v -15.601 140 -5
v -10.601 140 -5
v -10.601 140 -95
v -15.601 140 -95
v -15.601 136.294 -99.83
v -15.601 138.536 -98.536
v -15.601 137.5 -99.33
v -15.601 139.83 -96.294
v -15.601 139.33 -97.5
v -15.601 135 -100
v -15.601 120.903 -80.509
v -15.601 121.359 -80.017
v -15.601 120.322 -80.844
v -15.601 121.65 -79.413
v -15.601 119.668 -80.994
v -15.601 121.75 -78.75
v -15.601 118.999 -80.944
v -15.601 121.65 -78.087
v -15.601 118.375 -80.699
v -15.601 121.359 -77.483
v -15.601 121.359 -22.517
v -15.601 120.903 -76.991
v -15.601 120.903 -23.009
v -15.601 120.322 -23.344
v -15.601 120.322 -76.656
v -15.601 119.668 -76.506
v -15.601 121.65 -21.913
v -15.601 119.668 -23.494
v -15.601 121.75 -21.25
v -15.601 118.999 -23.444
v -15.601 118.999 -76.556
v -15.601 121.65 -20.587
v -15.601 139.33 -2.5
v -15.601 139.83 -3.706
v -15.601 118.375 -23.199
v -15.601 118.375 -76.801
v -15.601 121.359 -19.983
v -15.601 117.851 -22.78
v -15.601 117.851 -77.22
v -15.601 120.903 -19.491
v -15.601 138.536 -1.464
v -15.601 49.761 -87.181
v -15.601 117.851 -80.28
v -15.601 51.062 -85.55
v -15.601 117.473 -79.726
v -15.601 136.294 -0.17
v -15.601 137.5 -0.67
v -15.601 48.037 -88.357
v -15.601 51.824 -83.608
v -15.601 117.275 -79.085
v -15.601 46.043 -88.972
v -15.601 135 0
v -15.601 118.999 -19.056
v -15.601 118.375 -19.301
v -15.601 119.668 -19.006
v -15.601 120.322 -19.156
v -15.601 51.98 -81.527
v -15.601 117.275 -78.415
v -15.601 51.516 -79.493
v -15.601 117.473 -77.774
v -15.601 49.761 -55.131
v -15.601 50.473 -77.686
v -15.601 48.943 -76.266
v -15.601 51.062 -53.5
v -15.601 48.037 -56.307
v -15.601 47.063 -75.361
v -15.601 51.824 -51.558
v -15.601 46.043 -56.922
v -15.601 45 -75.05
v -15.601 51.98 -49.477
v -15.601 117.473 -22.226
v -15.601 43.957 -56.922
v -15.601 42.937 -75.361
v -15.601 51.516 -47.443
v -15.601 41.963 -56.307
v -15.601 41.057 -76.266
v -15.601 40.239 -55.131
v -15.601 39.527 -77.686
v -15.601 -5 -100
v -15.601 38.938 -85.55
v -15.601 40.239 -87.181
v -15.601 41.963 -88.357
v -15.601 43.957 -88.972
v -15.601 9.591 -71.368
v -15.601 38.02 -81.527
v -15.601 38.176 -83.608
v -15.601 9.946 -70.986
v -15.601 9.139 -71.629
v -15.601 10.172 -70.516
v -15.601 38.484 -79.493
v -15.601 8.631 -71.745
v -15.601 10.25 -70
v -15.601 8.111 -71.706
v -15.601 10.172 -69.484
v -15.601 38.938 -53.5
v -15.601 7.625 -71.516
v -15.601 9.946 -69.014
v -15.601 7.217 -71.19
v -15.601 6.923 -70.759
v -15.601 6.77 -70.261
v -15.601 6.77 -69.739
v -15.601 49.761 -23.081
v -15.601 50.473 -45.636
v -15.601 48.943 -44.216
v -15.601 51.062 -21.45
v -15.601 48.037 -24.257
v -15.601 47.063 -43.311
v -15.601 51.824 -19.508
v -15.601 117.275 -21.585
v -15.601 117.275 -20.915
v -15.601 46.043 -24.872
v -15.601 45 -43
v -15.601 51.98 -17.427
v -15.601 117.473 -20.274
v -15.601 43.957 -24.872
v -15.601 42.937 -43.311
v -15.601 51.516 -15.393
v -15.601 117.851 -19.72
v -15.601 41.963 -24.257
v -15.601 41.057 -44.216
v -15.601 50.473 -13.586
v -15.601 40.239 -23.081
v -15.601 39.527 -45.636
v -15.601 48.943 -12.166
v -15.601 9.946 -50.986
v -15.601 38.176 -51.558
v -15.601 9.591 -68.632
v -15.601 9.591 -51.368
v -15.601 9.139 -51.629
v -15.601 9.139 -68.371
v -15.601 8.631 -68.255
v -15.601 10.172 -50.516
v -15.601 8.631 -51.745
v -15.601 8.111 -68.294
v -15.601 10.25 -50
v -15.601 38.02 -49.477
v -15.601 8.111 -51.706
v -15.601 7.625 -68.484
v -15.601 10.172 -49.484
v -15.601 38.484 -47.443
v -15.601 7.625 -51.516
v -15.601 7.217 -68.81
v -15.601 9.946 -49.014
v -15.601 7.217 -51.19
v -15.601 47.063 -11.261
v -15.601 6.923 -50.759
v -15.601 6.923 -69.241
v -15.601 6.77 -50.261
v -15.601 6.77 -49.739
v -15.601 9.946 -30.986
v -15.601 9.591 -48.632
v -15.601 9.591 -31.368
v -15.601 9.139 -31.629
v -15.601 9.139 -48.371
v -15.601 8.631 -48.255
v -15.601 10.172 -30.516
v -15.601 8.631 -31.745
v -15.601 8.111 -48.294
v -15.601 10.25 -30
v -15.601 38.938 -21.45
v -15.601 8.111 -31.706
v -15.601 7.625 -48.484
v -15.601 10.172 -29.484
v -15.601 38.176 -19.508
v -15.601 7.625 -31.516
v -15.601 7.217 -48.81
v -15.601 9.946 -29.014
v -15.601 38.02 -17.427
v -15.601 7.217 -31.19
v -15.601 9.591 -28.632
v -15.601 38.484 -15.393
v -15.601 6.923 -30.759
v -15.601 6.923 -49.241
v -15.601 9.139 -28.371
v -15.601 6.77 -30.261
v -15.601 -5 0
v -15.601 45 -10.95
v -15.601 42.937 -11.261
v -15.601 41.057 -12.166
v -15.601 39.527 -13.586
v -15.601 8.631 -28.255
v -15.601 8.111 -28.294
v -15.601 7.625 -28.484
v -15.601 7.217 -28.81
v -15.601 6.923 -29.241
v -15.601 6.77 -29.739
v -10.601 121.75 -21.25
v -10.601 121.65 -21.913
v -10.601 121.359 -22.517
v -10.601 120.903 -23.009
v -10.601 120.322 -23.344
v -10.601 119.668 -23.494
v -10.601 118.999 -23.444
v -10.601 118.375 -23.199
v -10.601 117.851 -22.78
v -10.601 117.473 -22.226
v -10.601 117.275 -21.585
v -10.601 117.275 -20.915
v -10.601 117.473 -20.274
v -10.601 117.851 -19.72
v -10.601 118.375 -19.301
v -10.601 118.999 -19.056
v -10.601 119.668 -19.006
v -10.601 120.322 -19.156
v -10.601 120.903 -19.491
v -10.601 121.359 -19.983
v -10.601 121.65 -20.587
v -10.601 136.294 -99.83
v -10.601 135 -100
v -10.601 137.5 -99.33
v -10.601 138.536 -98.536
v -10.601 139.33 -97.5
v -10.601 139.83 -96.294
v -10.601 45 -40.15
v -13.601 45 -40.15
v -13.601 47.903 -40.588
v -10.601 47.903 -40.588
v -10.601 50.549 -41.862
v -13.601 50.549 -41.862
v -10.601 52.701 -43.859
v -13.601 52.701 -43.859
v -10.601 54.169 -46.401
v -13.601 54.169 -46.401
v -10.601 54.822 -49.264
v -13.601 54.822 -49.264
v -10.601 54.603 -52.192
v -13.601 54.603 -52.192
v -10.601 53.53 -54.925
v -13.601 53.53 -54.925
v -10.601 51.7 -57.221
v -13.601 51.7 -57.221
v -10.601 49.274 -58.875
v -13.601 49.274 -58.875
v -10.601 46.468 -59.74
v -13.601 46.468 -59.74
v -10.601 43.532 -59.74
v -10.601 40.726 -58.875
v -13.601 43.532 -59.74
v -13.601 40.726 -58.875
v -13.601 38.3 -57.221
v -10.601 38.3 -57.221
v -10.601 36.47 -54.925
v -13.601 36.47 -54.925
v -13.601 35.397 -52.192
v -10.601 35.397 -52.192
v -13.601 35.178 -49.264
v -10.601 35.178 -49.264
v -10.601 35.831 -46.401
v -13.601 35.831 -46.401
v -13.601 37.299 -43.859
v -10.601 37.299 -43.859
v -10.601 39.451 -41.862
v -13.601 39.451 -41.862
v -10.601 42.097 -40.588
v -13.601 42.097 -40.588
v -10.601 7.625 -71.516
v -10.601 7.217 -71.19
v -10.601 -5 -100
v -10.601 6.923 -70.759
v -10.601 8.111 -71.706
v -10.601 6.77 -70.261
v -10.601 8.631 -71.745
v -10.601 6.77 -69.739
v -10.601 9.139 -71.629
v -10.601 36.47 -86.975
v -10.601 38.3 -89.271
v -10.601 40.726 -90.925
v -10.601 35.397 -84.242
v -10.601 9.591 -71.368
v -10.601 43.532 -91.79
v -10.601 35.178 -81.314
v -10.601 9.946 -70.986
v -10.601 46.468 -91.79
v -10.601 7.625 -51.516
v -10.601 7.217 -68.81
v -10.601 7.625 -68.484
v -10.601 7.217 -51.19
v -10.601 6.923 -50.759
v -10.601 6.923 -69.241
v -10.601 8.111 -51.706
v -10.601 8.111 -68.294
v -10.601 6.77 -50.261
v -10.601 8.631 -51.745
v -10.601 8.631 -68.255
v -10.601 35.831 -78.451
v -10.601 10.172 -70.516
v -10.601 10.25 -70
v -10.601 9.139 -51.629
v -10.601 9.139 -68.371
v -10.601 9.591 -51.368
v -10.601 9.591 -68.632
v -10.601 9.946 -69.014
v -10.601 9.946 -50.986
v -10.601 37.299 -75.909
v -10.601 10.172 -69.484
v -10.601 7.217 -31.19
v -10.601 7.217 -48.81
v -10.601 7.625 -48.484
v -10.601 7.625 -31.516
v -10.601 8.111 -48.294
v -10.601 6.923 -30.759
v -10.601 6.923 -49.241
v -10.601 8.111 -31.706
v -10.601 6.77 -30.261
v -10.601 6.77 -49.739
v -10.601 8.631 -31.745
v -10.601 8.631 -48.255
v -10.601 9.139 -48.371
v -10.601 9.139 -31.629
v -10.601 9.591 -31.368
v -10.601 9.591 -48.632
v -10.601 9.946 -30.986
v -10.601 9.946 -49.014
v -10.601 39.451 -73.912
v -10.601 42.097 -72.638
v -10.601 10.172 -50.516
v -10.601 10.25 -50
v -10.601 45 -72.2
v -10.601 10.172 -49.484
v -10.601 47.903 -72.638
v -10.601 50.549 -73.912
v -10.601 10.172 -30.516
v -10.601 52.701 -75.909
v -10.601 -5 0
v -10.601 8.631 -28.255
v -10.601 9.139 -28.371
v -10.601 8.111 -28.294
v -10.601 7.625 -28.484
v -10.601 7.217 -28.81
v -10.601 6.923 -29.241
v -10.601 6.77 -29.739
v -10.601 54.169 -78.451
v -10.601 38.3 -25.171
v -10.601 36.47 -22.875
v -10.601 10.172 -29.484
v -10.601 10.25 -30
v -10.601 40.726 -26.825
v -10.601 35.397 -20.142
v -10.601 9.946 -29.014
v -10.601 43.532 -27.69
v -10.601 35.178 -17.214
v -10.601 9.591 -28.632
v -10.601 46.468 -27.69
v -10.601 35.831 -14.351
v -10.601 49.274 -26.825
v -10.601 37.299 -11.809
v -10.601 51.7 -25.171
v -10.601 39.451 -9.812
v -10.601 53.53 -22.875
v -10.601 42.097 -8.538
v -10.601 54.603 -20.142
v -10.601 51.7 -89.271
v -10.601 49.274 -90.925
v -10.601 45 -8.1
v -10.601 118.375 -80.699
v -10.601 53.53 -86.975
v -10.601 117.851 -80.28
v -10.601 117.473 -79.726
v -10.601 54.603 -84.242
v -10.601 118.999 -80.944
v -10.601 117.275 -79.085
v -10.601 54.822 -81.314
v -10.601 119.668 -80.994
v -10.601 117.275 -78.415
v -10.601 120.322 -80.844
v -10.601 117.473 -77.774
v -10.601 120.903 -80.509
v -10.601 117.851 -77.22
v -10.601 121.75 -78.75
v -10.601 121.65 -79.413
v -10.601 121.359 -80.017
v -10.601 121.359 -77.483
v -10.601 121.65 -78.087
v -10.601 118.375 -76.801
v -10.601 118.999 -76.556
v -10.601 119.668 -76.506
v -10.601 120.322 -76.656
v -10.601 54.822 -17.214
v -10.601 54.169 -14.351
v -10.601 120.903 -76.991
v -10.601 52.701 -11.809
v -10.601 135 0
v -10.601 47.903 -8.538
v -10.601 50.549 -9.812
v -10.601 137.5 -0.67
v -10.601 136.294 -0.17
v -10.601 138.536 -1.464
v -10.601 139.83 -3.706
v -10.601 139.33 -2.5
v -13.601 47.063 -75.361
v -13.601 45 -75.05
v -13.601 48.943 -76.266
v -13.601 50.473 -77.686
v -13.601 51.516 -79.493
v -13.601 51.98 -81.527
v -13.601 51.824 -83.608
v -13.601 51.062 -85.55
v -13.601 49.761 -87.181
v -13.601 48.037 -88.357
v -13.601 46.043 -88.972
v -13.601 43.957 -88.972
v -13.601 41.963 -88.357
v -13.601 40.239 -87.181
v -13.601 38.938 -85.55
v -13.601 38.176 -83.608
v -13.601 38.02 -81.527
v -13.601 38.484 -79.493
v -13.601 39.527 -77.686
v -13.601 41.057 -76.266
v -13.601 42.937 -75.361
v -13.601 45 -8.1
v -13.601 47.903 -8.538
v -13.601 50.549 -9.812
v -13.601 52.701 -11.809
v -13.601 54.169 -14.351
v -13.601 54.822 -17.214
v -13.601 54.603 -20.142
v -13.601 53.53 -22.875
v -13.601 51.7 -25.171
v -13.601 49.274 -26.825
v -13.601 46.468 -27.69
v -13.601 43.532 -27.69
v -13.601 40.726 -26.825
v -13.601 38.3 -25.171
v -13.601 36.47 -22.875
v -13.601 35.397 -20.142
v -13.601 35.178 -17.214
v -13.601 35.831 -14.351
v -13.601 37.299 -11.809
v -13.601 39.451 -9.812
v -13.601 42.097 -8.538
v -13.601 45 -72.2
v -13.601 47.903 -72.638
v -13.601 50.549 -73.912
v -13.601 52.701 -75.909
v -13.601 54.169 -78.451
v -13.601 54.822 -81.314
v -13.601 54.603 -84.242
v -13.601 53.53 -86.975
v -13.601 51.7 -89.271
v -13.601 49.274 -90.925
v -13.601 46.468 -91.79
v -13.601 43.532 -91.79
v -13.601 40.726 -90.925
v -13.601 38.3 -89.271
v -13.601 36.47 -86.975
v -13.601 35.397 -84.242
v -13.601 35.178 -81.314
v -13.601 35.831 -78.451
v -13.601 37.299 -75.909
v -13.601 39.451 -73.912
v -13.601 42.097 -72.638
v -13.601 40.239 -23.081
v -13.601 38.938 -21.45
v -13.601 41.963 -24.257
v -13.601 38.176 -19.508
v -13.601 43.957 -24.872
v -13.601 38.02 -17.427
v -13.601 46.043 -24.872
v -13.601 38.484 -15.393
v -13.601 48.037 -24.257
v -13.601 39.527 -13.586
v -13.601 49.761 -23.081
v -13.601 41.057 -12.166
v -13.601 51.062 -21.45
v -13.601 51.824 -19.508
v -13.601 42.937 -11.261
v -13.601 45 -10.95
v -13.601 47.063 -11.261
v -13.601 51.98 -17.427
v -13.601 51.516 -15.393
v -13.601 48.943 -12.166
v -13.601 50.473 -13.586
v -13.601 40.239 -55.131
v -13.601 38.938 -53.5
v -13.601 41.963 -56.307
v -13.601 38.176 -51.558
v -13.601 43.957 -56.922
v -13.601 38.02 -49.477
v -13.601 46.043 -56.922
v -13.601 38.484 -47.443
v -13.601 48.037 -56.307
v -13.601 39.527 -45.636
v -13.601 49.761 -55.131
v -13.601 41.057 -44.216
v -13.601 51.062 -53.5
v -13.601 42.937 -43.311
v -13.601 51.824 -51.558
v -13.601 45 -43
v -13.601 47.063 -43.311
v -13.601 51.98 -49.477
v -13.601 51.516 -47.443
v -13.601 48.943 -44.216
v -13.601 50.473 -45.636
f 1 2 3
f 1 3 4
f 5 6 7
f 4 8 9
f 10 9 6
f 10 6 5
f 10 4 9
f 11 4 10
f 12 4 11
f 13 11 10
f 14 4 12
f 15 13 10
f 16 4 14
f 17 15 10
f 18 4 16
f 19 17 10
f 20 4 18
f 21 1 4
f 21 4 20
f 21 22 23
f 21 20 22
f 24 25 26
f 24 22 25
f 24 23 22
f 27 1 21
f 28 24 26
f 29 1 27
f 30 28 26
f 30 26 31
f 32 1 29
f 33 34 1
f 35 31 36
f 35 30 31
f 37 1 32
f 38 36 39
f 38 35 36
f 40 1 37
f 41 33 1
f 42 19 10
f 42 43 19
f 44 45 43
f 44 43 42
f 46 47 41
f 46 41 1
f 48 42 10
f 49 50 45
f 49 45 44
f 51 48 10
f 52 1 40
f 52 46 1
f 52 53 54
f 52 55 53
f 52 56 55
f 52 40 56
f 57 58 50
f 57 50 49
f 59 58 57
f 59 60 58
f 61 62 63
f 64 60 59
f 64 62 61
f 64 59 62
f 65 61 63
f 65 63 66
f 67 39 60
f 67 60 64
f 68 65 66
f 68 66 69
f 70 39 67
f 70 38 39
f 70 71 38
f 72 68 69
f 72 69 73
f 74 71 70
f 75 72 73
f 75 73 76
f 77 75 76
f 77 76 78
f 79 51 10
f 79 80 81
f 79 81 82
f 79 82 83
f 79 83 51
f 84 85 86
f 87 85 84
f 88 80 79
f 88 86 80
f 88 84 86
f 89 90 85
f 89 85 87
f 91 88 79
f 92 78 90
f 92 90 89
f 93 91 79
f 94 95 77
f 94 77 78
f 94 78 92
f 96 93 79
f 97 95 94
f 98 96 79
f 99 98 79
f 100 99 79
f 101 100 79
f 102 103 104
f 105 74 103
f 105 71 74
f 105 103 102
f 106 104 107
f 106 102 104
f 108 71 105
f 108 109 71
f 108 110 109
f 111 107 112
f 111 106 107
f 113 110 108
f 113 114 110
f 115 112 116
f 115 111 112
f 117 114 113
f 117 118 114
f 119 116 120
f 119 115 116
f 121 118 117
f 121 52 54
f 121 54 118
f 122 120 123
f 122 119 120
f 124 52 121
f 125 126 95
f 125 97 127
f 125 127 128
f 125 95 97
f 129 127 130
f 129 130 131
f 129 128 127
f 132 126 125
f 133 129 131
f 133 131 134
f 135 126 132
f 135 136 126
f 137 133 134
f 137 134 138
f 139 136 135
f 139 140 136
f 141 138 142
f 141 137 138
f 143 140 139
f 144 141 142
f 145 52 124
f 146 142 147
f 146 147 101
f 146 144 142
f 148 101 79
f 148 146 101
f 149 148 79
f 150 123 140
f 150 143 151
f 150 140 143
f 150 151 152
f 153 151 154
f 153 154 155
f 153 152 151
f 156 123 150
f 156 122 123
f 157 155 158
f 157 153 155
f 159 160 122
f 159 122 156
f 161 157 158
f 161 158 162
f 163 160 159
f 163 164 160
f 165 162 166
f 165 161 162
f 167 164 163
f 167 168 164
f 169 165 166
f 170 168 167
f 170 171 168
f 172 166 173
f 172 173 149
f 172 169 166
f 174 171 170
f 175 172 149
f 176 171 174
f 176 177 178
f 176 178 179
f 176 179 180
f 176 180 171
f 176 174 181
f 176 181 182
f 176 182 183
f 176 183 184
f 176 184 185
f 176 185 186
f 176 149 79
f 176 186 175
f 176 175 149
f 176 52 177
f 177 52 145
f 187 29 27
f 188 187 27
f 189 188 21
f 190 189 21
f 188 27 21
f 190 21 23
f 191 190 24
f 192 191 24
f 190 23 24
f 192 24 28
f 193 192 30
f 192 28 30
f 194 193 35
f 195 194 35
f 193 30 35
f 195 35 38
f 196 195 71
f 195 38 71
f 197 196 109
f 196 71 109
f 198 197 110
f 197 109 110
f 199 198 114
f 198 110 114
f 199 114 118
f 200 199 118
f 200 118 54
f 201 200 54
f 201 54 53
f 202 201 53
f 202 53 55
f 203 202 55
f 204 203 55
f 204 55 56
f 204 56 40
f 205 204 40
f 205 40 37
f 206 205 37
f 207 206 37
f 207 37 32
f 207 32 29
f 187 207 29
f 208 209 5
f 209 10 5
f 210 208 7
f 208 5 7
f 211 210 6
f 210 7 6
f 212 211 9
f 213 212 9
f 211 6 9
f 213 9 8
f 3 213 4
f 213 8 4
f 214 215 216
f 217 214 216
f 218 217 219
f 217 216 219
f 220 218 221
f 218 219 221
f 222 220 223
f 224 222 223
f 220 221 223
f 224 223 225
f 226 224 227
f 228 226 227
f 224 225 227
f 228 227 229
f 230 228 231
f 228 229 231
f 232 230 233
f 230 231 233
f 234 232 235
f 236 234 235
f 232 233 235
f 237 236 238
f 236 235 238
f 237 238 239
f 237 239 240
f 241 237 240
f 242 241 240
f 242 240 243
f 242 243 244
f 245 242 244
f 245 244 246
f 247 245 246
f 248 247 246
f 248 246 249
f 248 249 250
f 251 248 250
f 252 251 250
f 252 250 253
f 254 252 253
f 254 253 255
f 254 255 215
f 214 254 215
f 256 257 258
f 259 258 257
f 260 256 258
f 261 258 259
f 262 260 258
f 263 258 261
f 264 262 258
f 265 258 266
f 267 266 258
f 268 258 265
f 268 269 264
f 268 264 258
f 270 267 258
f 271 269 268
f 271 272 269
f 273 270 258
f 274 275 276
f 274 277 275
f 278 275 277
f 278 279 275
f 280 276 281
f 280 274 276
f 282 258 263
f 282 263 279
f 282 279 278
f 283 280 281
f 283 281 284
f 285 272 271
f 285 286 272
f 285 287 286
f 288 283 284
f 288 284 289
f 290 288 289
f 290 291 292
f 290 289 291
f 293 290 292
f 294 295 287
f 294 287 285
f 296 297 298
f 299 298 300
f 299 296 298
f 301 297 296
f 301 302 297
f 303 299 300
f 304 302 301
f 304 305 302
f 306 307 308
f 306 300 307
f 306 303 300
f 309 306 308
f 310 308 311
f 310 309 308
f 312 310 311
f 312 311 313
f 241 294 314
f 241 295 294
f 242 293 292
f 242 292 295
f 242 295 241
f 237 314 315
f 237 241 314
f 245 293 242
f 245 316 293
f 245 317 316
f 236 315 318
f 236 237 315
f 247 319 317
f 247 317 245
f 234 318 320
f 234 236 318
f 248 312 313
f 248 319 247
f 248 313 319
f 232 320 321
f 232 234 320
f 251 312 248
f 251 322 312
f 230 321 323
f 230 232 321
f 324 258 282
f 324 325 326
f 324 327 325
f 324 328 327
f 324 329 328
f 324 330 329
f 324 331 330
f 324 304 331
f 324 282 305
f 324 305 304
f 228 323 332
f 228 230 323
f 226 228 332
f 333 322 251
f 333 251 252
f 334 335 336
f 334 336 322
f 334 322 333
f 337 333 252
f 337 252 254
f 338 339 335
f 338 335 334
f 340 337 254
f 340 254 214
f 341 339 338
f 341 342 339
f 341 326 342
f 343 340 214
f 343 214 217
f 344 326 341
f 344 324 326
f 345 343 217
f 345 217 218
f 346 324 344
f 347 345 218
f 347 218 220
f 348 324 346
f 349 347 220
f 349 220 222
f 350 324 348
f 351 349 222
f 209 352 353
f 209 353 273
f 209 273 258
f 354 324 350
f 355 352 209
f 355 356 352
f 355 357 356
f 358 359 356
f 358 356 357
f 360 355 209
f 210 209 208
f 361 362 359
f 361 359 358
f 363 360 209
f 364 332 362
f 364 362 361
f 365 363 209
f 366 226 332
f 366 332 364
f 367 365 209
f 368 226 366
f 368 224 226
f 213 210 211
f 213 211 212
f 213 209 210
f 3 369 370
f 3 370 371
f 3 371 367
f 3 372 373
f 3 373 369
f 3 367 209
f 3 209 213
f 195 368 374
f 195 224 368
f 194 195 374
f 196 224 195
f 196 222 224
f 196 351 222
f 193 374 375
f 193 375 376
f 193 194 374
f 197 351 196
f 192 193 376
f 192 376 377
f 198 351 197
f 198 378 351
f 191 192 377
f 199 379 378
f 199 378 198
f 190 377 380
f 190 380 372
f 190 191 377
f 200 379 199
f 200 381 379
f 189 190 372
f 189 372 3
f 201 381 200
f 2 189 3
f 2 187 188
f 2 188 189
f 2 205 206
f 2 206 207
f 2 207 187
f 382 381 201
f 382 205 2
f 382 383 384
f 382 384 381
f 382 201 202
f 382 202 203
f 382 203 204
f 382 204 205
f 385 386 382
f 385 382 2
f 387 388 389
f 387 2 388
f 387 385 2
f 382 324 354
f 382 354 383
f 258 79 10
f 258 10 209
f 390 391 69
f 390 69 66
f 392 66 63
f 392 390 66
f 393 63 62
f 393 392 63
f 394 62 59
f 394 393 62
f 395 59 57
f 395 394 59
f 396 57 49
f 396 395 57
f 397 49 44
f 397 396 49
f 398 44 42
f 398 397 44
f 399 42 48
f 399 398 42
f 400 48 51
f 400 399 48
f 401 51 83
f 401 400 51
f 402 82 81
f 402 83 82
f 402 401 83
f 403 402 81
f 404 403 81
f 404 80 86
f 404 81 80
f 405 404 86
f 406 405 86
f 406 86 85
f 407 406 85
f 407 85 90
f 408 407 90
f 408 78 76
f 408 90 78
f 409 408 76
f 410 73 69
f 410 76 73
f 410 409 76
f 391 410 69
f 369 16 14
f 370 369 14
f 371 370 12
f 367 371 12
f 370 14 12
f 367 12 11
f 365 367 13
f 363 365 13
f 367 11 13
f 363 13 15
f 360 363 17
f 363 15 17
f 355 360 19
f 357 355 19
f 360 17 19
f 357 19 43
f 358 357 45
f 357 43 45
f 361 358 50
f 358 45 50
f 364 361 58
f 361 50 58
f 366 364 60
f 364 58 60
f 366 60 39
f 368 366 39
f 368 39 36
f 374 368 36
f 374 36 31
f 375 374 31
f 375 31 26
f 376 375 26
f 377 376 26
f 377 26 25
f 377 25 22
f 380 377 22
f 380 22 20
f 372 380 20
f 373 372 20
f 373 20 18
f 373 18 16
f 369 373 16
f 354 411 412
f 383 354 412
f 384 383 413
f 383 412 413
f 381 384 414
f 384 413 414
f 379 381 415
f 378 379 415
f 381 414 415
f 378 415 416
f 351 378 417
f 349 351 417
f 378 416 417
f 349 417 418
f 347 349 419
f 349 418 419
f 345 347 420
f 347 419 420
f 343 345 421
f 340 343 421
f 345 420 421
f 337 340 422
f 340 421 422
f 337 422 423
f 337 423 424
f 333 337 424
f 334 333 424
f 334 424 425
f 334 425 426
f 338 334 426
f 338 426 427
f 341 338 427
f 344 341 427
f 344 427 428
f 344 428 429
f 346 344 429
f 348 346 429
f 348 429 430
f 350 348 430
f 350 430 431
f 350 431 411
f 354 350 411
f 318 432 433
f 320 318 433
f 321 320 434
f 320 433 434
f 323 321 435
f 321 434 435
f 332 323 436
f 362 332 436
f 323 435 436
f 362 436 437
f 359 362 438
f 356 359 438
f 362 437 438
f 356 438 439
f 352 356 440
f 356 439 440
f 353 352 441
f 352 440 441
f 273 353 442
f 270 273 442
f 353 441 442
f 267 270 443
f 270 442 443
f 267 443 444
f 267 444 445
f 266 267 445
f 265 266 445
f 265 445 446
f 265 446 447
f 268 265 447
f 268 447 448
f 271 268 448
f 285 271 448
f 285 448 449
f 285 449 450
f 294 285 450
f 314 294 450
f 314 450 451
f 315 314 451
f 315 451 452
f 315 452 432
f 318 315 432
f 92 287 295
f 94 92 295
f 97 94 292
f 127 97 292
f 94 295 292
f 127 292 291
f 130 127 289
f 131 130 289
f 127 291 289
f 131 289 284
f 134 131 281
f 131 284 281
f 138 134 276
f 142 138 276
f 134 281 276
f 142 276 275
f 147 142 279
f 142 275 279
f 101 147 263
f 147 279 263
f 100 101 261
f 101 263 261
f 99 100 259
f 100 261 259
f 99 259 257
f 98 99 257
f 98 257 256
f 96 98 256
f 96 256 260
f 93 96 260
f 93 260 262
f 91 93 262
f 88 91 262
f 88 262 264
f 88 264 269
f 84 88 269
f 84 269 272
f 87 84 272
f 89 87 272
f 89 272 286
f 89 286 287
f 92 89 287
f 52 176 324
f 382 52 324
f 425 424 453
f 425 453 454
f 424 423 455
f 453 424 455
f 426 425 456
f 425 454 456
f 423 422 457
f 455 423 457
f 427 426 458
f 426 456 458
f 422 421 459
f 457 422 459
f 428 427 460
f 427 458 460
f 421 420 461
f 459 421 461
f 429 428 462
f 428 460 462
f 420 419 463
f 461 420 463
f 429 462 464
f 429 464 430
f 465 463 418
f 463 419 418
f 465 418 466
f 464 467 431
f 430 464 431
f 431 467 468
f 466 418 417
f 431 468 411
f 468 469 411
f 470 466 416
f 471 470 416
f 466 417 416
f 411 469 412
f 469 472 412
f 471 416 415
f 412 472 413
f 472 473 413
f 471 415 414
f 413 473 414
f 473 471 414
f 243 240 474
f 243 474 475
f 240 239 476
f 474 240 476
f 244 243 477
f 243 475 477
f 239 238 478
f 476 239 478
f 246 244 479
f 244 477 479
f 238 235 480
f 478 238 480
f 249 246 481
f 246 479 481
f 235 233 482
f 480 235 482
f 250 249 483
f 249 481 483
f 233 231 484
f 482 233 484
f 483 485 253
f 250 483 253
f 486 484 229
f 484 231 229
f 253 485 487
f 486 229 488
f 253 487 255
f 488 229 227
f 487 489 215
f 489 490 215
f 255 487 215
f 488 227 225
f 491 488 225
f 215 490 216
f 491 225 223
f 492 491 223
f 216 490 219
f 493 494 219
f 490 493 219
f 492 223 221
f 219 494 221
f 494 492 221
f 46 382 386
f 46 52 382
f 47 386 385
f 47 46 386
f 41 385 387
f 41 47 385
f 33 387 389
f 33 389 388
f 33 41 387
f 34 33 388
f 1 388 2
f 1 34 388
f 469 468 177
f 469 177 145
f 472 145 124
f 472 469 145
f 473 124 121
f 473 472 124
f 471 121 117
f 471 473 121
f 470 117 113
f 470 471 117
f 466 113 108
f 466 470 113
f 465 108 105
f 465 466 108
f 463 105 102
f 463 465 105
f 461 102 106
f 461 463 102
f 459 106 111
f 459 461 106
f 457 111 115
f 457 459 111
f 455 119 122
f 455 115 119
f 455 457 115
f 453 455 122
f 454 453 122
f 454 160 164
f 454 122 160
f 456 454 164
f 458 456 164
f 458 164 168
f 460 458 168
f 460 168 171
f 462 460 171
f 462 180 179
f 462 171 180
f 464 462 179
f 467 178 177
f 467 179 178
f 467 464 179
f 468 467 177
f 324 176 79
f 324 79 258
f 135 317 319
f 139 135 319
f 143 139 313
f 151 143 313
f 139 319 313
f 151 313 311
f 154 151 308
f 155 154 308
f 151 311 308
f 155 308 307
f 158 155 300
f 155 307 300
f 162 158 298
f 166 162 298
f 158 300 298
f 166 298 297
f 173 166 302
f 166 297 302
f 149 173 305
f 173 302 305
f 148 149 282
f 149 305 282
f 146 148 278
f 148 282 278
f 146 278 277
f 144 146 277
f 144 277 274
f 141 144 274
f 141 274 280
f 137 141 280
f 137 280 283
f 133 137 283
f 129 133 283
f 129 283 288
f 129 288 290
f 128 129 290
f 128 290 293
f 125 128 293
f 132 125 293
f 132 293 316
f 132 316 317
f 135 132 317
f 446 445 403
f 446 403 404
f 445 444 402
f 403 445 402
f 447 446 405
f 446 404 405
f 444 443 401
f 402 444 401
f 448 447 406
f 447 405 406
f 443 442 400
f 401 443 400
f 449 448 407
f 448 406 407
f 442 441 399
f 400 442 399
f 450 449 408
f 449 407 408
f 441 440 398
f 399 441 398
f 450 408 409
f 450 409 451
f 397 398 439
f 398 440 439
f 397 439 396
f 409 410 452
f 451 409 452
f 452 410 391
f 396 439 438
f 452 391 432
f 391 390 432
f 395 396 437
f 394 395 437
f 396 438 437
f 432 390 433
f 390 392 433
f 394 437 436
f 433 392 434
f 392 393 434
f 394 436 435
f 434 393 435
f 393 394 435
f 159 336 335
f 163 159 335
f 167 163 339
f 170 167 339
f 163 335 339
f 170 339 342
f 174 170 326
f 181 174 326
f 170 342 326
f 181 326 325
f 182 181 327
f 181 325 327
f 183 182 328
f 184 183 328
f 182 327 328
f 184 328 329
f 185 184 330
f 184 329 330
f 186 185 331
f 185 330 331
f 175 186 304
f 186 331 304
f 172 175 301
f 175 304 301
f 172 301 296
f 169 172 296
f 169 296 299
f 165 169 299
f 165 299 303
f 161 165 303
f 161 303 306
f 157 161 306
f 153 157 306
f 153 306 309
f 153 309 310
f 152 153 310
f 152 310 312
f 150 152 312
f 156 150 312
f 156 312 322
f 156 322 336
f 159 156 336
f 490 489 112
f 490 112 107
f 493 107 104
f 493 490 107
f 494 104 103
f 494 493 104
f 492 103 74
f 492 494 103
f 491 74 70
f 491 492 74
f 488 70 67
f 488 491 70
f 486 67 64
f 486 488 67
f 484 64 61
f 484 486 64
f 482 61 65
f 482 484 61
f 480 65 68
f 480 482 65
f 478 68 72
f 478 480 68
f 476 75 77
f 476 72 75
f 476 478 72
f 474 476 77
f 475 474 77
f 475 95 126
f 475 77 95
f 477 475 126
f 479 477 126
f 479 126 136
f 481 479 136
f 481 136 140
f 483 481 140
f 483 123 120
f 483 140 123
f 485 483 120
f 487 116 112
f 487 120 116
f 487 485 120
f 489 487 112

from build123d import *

# Parameters (mm, degrees)
BOSS_EXTRUDE1_DEPTH            = 100
CUT_EXTRUDE3_DEPTH             = 202.556443707
CUT_EXTRUDE3_DEPTH_BACK        = 202.556443707
SKETCH4_4_R                    = 9.85
CUT_EXTRUDE4_DEPTH             = 3
CUT_EXTRUDE5_START             = 103
SKETCH4_6_R                    = 9.85
CUT_EXTRUDE5_DEPTH             = 103
CUT_EXTRUDE6_REACH             = 206.206
SKETCH5_R                      = 2.25
CUT_EXTRUDE6_DIRECTION_2_DEPTH = 205.205778567
CUT_EXTRUDE7_REACH             = 201.841
SKETCH6_R                      = 2.25
SKETCH7_W                      = 12
SKETCH7_H                      = 15
CUT_EXTRUDE8_DEPTH             = 197.242821038
FILLET3_R                      = 2.5
FILLET4_R                      = 2.5
FILLET6_R                      = 5
CUT_EXTRUDE11_REACH            = 198.243
SKETCH8_W                      = 41.5
SKETCH8_H                      = 5
CUT_EXTRUDE12_REACH            = 174.119
SKETCH9_R                      = 1.75


with BuildPart() as part:
    # Sketch1 → Boss-Extrude1 (new body)
    with BuildSketch(Plane.XY):
        Polygon((-10.600610125, 140), (-15.600610125, 140), (-15.600610125, -5), (94.399389875, -5), (94.399389875, 140), (89.399389875, 140), (89.399389875, 0), (-10.600610125, 0), align=None)
    extrude(amount=-BOSS_EXTRUDE1_DEPTH)

    # Sketch4 → Cut-Extrude3 (cut, two sides: drawn at the far end of the back side and taken through both)
    with BuildSketch(Plane.ZY.offset(-89.399389875).offset(-CUT_EXTRUDE3_DEPTH_BACK)):
        with BuildLine():
            ThreePointArc((-89.05, 45), (-82.05, 38), (-75.05, 45))
            Line((-75.05, 45), (-82.05, 45))
            Line((-82.05, 45), (-89.05, 45))
        make_face()
        with BuildLine():
            Line((-82.05, 45), (-75.05, 45))
            ThreePointArc((-75.05, 45), (-82.05, 52), (-89.05, 45))
            Line((-89.05, 45), (-82.05, 45))
        make_face()
        with BuildLine():
            ThreePointArc((-57, 45), (-50, 38), (-43, 45))
            Line((-43, 45), (-50, 45))
            Line((-50, 45), (-57, 45))
        make_face()
        with BuildLine():
            Line((-50, 45), (-43, 45))
            ThreePointArc((-43, 45), (-50, 52), (-57, 45))
            Line((-57, 45), (-50, 45))
        make_face()
        with BuildLine():
            ThreePointArc((-24.95, 45), (-17.95, 38), (-10.95, 45))
            Line((-10.95, 45), (-17.95, 45))
            Line((-17.95, 45), (-24.95, 45))
        make_face()
        with BuildLine():
            Line((-17.95, 45), (-10.95, 45))
            ThreePointArc((-10.95, 45), (-17.95, 52), (-24.95, 45))
            Line((-24.95, 45), (-17.95, 45))
        make_face()
    extrude(amount=CUT_EXTRUDE3_DEPTH + CUT_EXTRUDE3_DEPTH_BACK, mode=Mode.SUBTRACT)

    # Sketch4<4> → Cut-Extrude4 (cut)
    with BuildSketch(Plane.ZY.offset(-89.399389875)):
        with Locations((-50, 45)):
            Circle(SKETCH4_4_R)
        with Locations((-82.05, 45)):
            Circle(SKETCH4_4_R)
        with Locations((-17.95, 45)):
            Circle(SKETCH4_4_R)
    extrude(amount=-CUT_EXTRUDE4_DEPTH, mode=Mode.SUBTRACT)

    # Sketch4<6> → Cut-Extrude5 (cut)
    with BuildSketch(Plane.ZY.offset(-89.399389875).offset(CUT_EXTRUDE5_START)):
        with Locations((-50, 45)):
            Circle(SKETCH4_6_R)
        with Locations((-82.05, 45)):
            Circle(SKETCH4_6_R)
        with Locations((-17.95, 45)):
            Circle(SKETCH4_6_R)
    extrude(amount=-CUT_EXTRUDE5_DEPTH, mode=Mode.SUBTRACT)

    # Sketch5 → Cut-Extrude6 (cut, up to next)
    with BuildSketch(Plane.ZY.offset(15.600610125), mode=Mode.PRIVATE) as cut_extrude6_sk1:
        with Locations(Location((-78.75, 119.5, 0), (0, 0, 90))):
            Circle(SKETCH5_R)
    cut_extrude6_tool1 = extrude(cut_extrude6_sk1.sketch, amount=-CUT_EXTRUDE6_REACH, mode=Mode.PRIVATE) & part.part
    # Sketch5 → Cut-Extrude6 (cut, up to next)
    with BuildSketch(Plane.ZY.offset(15.600610125), mode=Mode.PRIVATE) as cut_extrude6_sk2:
        with Locations(Location((-21.25, 119.5, 0), (0, 0, 90))):
            Circle(SKETCH5_R)
    cut_extrude6_tool2 = extrude(cut_extrude6_sk2.sketch, amount=-CUT_EXTRUDE6_REACH, mode=Mode.PRIVATE) & part.part
    add(cut_extrude6_tool1.solids().sort_by_distance((-15.60061, 119.5, -78.75))[0], mode=Mode.SUBTRACT)
    add(cut_extrude6_tool2.solids().sort_by_distance((-15.60061, 119.5, -21.25))[0], mode=Mode.SUBTRACT)

    # Sketch5 → Cut-Extrude6 direction 2 (cut)
    with BuildSketch(Plane.ZY.offset(15.600610125)):
        with Locations(Location((-78.75, 119.5, 0), (0, 0, 90))):
            Circle(SKETCH5_R)
        with Locations(Location((-21.25, 119.5, 0), (0, 0, 90))):
            Circle(SKETCH5_R)
    extrude(amount=CUT_EXTRUDE6_DIRECTION_2_DEPTH, mode=Mode.SUBTRACT)

    # Sketch6 → Cut-Extrude7 (cut, up to next)
    with BuildSketch(Plane.XZ.offset(5), mode=Mode.PRIVATE) as cut_extrude7_sk1:
        with Locations(Location((71.899389875, -50, 0), (0, 0, 270))):
            Circle(SKETCH6_R)
    cut_extrude7_tool1 = extrude(cut_extrude7_sk1.sketch, amount=-CUT_EXTRUDE7_REACH, mode=Mode.PRIVATE) & part.part
    # Sketch6 → Cut-Extrude7 (cut, up to next)
    with BuildSketch(Plane.XZ.offset(5), mode=Mode.PRIVATE) as cut_extrude7_sk2:
        with Locations(Location((6.899389875, -50, 0), (0, 0, 270))):
            Circle(SKETCH6_R)
    cut_extrude7_tool2 = extrude(cut_extrude7_sk2.sketch, amount=-CUT_EXTRUDE7_REACH, mode=Mode.PRIVATE) & part.part
    add(cut_extrude7_tool1.solids().sort_by_distance((71.89939, -5, -50))[0], mode=Mode.SUBTRACT)
    add(cut_extrude7_tool2.solids().sort_by_distance((6.89939, -5, -50))[0], mode=Mode.SUBTRACT)

    # Sketch7 → Cut-Extrude8 (cut, through all)
    with BuildSketch(Plane(origin=(0, 0, 0), x_dir=(1, 0, 0), z_dir=(0, 1, 0))):
        Polygon((45.399389875, 100), (39.399389875, 100), (33.399389875, 100), (33.399389875, 85), (45.399389875, 85), align=None)
        with Locations((39.399389875, 7.5)):
            Rectangle(SKETCH7_W, SKETCH7_H)
    extrude(amount=-CUT_EXTRUDE8_DEPTH, mode=Mode.SUBTRACT)

    # Fillet3
    fillet3_edges = [part.edges().sort_by_distance(p)[0] for p in [
        (33.399389875, 0, -7.5),
        (33.399389875, -2.5, 0),
        (39.399389875, 0, -15),
        (33.399389875, -2.5, -15),
        (45.399389875, -5, -7.5),
        (45.399389875, -2.5, -15),
        (45.399389875, -2.5, 0),
        (33.399389875, -5, -7.5),
        (39.399389875, -5, -15),
        (45.399389875, 0, -7.5),
    ]]
    fillet(fillet3_edges, radius=FILLET3_R - 0.0001)  # a hair under: the kernel refuses the full size

    # Fillet4
    fillet4_edges = [part.edges().sort_by_distance(p)[0] for p in [
        (45.399389875, 0, -92.5),
        (45.399389875, -2.5, -100),
        (39.399389875, -5, -85),
        (45.399389875, -2.5, -85),
        (33.399389875, -5, -92.5),
        (33.399389875, -2.5, -85),
        (33.399389875, -2.5, -100),
        (45.399389875, -5, -92.5),
        (33.399389875, 0, -92.5),
        (39.399389875, 0, -85),
    ]]
    fillet(fillet4_edges, radius=FILLET4_R - 0.0001)  # a hair under: the kernel refuses the full size

    # Fillet6
    fillet6_edges = [part.edges().sort_by_distance(p)[0] for p in [
        (91.899389875, 140, -100),
        (-13.100610125, 140, -100),
        (-13.100610125, 140, 0),
        (91.899389875, 140, 0),
    ]]
    fillet(fillet6_edges, radius=FILLET6_R)

    # Sketch8 → Cut-Extrude11 (cut, up to next)
    with BuildSketch(Plane.XY, mode=Mode.PRIVATE) as cut_extrude11_sk1:
        with Locations((10.149389875, -2.5)):
            Rectangle(SKETCH8_W, SKETCH8_H)
    cut_extrude11_tool1 = extrude(cut_extrude11_sk1.sketch, amount=-CUT_EXTRUDE11_REACH, mode=Mode.PRIVATE) & part.part
    # Sketch8 → Cut-Extrude11 (cut, up to next)
    with BuildSketch(Plane.XY, mode=Mode.PRIVATE) as cut_extrude11_sk2:
        Polygon((-10.600610125, 135), (-10.600610125, 0), (30.899389875, 0), (30.899389875, -5), (94.399389875, -5), (94.399389875, 140), (-10.600610125, 140), align=None)
    cut_extrude11_tool2 = extrude(cut_extrude11_sk2.sketch, amount=-CUT_EXTRUDE11_REACH, mode=Mode.PRIVATE) & part.part
    add(cut_extrude11_tool1.solids().sort_by_distance((10.14939, -2.5, 0))[0], mode=Mode.SUBTRACT)
    add(cut_extrude11_tool2.solids().sort_by_distance((42.338086, 68.467205, 0))[0], mode=Mode.SUBTRACT)

    # Sketch9 → Cut-Extrude12 (cut, up to next)
    with BuildSketch(Plane(origin=(-10.600610125, 0, 0), x_dir=(0, 0, -1), z_dir=(1, 0, 0)), mode=Mode.PRIVATE) as cut_extrude12_sk1:
        with Locations(Location((70, 8.5, 0), (0, 0, 90))):
            Circle(SKETCH9_R)
    cut_extrude12_tool1 = extrude(cut_extrude12_sk1.sketch, amount=-CUT_EXTRUDE12_REACH, mode=Mode.PRIVATE) & part.part
    # Sketch9 → Cut-Extrude12 (cut, up to next)
    with BuildSketch(Plane(origin=(-10.600610125, 0, 0), x_dir=(0, 0, -1), z_dir=(1, 0, 0)), mode=Mode.PRIVATE) as cut_extrude12_sk2:
        with Locations(Location((50, 8.5, 0), (0, 0, 90))):
            Circle(SKETCH9_R)
    cut_extrude12_tool2 = extrude(cut_extrude12_sk2.sketch, amount=-CUT_EXTRUDE12_REACH, mode=Mode.PRIVATE) & part.part
    # Sketch9 → Cut-Extrude12 (cut, up to next)
    with BuildSketch(Plane(origin=(-10.600610125, 0, 0), x_dir=(0, 0, -1), z_dir=(1, 0, 0)), mode=Mode.PRIVATE) as cut_extrude12_sk3:
        with Locations(Location((30, 8.5, 0), (0, 0, 90))):
            Circle(SKETCH9_R)
    cut_extrude12_tool3 = extrude(cut_extrude12_sk3.sketch, amount=-CUT_EXTRUDE12_REACH, mode=Mode.PRIVATE) & part.part
    add(cut_extrude12_tool1.solids().sort_by_distance((-10.60061, 8.5, -70))[0], mode=Mode.SUBTRACT)
    add(cut_extrude12_tool2.solids().sort_by_distance((-10.60061, 8.5, -50))[0], mode=Mode.SUBTRACT)
    add(cut_extrude12_tool3.solids().sort_by_distance((-10.60061, 8.5, -30))[0], mode=Mode.SUBTRACT)


solid = part.part
